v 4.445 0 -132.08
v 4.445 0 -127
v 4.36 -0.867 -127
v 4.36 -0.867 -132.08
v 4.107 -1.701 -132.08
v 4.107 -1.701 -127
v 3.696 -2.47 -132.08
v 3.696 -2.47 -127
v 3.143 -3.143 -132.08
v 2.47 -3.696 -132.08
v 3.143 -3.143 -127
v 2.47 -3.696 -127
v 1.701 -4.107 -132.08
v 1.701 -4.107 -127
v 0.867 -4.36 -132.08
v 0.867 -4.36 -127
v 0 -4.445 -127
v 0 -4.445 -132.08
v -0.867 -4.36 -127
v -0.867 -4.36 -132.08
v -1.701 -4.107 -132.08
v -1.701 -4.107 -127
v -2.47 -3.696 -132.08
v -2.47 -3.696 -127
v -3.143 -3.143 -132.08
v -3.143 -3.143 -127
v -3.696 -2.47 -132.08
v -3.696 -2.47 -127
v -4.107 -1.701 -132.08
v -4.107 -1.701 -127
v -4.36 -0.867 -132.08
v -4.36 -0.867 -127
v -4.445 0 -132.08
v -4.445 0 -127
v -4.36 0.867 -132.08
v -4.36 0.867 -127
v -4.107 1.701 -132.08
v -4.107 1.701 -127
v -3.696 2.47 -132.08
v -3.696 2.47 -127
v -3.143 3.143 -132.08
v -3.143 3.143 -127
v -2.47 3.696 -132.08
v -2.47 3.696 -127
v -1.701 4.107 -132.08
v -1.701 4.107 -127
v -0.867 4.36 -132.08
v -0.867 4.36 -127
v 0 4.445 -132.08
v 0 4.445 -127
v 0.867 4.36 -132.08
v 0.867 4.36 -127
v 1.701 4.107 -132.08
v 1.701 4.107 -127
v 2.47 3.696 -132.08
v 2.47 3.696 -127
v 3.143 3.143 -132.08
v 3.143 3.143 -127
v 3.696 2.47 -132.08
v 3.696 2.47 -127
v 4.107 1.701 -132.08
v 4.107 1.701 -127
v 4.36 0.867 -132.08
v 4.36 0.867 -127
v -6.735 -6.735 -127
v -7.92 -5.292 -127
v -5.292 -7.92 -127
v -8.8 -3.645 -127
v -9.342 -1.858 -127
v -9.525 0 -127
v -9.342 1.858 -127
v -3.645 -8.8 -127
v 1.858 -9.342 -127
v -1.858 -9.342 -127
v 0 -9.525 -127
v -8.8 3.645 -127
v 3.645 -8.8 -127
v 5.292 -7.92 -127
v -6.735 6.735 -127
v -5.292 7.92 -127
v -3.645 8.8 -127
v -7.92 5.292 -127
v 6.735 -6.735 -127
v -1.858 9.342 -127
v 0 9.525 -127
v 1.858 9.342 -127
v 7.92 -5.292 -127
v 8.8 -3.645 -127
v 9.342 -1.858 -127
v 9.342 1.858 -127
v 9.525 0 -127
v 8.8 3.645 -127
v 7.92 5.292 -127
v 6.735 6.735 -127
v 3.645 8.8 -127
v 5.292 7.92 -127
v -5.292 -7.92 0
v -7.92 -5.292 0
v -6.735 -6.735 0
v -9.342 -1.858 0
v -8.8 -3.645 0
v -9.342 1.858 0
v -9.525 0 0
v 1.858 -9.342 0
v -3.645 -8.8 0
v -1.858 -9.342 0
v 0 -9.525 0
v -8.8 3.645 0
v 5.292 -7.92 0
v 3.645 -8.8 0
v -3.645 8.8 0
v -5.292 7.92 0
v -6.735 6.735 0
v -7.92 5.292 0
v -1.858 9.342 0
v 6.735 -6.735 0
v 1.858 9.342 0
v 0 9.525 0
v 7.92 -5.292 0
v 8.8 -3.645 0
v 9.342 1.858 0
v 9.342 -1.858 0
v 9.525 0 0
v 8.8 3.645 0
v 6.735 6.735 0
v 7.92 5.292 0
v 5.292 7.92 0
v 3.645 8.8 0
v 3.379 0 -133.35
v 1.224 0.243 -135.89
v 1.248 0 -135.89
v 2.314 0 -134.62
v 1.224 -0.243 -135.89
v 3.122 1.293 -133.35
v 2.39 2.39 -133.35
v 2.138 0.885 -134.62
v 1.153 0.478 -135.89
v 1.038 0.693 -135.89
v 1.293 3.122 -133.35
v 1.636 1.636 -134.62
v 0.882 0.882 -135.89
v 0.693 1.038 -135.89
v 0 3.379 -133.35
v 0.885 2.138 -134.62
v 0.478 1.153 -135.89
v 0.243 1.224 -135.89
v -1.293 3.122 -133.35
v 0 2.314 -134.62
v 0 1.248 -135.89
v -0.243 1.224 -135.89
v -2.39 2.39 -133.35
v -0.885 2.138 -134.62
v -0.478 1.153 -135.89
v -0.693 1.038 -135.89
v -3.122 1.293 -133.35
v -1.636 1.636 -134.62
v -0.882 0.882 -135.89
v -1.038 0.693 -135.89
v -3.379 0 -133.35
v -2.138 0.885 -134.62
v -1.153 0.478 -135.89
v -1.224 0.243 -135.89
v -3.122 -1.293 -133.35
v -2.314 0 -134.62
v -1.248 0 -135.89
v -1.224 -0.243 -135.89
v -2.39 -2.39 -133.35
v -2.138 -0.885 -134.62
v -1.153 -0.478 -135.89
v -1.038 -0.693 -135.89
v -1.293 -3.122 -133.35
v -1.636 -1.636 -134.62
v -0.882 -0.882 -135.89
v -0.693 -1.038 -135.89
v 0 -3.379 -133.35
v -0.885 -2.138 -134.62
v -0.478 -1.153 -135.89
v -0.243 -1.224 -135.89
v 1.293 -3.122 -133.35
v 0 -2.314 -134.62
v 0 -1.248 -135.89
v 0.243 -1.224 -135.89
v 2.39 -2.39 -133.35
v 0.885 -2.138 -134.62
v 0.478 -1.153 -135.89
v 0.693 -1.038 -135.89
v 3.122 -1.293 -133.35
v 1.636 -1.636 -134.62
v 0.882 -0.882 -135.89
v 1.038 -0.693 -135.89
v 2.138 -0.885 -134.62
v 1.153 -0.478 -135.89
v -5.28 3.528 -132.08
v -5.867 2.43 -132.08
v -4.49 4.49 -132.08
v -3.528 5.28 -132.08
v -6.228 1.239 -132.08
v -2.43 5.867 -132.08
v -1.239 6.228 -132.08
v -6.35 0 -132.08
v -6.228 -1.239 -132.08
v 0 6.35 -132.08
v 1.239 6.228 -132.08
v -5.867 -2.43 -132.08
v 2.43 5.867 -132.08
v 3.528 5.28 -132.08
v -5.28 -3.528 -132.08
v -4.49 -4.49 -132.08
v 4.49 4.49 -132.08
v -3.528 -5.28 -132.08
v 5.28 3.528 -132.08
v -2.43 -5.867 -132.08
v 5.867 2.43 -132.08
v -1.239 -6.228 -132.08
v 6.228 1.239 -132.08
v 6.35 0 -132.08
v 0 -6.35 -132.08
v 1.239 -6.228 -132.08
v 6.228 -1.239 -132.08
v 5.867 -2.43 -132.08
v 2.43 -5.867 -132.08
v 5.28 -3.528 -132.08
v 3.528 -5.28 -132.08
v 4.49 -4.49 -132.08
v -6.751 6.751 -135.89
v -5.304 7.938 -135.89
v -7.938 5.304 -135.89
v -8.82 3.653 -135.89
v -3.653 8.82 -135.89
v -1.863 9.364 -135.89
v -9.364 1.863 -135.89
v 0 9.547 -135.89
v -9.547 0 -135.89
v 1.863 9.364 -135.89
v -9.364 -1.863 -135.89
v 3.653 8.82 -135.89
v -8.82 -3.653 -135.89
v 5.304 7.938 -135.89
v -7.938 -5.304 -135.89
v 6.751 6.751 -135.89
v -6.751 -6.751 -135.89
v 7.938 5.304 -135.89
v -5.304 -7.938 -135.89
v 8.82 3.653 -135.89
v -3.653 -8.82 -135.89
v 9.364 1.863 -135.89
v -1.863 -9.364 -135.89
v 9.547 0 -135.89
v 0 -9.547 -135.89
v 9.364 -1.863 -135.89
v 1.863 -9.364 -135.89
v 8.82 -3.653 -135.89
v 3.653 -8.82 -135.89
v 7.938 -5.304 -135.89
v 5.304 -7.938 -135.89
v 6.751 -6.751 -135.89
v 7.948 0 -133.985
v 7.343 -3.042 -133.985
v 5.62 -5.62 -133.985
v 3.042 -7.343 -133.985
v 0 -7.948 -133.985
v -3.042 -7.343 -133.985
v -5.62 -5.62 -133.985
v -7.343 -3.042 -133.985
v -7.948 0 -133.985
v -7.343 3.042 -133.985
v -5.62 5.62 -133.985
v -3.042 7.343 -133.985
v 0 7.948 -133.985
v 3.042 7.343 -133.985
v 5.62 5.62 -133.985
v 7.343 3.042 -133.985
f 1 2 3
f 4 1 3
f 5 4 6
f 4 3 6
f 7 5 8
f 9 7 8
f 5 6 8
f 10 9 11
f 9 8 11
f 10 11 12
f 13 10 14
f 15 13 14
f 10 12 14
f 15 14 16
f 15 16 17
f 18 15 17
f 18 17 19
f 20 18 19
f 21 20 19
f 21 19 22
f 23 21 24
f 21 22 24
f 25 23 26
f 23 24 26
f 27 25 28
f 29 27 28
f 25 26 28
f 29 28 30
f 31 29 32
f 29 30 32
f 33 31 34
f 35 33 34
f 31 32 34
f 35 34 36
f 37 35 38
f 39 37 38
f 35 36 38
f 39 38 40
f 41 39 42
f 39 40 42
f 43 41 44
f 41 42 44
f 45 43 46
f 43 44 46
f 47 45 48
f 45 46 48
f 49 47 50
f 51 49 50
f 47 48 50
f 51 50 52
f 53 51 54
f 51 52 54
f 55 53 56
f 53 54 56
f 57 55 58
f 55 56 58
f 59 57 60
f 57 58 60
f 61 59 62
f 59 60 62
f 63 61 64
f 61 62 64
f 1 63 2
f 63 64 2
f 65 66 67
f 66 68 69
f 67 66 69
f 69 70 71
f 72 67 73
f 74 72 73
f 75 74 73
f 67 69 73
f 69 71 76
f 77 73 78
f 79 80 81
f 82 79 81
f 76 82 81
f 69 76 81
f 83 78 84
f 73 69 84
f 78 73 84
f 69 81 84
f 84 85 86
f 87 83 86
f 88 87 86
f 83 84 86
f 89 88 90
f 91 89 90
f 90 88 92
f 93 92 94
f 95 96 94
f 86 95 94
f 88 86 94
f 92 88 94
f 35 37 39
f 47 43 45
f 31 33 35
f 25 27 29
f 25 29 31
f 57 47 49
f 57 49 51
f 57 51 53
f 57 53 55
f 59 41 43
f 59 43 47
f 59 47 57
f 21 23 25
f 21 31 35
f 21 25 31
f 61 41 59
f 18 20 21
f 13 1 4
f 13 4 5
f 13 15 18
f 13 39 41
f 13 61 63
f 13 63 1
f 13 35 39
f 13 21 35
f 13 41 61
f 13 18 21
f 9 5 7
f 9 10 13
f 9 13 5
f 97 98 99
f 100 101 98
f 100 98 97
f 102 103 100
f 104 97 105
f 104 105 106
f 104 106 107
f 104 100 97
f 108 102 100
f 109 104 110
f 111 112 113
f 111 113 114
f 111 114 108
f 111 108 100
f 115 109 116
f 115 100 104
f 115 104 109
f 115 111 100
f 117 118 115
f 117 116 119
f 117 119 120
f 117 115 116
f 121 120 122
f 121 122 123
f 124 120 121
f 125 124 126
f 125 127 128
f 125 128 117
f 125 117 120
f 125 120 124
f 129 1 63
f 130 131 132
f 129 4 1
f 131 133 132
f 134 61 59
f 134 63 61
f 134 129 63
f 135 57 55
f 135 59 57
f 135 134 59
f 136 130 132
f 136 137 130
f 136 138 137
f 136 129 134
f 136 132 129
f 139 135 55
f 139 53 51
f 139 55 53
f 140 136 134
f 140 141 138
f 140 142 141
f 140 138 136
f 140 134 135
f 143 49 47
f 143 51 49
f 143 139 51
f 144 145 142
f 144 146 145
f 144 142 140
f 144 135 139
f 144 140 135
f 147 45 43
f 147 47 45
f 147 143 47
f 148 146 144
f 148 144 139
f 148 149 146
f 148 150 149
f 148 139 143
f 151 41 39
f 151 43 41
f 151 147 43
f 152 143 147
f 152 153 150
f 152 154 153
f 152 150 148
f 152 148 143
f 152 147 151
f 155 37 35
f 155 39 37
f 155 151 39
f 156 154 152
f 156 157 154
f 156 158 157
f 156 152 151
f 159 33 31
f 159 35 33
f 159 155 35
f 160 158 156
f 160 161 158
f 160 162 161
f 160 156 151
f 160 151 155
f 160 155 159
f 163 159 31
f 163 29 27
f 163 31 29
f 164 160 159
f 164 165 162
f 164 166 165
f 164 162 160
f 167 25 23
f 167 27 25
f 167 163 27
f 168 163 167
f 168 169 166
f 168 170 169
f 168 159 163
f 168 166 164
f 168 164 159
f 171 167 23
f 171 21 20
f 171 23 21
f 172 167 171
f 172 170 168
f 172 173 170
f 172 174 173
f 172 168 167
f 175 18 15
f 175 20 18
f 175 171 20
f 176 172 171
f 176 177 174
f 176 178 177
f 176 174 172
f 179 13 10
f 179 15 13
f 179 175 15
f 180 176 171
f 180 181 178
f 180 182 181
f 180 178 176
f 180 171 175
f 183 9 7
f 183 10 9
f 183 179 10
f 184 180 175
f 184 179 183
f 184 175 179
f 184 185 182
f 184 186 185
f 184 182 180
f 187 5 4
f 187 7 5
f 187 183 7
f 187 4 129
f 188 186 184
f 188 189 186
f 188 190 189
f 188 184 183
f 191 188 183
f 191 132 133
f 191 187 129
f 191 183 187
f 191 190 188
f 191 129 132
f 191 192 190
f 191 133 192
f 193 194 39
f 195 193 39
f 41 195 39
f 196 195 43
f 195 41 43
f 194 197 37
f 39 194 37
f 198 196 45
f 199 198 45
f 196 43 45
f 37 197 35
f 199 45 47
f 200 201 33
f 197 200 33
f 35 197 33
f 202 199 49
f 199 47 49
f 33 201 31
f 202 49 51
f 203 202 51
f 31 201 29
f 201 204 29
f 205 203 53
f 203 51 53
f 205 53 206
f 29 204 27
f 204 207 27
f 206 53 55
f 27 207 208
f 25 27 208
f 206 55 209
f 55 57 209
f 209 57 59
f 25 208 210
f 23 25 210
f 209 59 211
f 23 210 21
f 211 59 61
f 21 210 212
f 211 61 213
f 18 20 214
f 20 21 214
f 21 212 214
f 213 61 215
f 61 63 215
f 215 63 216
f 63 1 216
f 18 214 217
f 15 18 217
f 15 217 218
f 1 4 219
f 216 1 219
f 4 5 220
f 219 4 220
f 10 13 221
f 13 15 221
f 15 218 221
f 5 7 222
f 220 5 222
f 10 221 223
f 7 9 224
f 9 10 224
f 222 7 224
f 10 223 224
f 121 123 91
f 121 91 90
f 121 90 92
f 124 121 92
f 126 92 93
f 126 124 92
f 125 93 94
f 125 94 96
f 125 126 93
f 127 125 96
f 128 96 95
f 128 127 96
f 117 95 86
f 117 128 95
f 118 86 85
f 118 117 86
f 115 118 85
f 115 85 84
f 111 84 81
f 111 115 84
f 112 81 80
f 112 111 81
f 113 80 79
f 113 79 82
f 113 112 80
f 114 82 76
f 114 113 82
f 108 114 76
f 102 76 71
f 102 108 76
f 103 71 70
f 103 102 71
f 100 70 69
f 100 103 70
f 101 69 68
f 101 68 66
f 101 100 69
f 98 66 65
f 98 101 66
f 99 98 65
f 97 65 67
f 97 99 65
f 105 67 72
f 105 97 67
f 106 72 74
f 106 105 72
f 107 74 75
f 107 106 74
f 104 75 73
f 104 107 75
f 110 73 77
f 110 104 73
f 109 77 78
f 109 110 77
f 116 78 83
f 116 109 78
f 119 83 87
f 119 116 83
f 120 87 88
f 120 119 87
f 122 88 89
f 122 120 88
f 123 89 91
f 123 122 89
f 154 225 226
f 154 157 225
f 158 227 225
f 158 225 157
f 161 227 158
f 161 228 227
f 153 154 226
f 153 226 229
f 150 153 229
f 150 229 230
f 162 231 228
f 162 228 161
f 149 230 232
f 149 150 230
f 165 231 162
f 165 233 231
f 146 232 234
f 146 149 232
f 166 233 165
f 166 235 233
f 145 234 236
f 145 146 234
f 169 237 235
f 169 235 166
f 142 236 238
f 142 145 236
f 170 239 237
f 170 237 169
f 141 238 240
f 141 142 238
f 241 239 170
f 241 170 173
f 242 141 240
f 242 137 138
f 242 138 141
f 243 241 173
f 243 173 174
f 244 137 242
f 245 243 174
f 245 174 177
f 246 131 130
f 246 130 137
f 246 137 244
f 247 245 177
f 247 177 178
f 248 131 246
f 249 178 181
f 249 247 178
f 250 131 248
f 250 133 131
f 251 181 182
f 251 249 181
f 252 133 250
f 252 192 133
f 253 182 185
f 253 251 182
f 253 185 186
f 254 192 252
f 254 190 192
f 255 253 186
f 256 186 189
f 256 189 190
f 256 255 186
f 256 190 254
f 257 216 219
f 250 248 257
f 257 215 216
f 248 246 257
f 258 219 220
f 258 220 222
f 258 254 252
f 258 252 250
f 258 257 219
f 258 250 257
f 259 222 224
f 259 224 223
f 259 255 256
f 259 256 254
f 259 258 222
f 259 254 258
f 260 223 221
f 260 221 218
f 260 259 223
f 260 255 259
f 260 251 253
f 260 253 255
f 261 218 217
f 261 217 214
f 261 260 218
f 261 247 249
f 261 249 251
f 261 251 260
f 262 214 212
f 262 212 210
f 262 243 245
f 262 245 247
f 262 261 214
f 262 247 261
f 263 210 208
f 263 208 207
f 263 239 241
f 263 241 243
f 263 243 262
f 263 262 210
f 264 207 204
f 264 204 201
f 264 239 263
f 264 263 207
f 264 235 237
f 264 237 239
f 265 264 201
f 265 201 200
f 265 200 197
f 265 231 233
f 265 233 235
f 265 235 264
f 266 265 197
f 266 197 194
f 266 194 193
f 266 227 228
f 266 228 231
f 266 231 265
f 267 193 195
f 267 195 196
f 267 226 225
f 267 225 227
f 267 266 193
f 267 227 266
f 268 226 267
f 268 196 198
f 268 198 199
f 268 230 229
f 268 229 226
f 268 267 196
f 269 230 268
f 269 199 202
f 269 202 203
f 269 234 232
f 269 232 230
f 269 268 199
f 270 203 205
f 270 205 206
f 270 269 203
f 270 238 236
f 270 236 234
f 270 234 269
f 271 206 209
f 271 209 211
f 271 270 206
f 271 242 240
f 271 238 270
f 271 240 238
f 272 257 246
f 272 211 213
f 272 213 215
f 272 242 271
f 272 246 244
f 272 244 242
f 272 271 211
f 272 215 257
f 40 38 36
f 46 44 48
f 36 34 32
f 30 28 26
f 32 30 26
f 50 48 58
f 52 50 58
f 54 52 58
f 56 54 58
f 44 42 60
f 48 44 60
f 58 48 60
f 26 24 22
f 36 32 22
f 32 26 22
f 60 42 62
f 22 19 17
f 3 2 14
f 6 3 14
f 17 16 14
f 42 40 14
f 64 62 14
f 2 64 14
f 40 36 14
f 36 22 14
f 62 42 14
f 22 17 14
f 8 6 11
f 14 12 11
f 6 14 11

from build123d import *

# Parameters (mm, degrees)
F0_R     = 9.525
F1_DEPTH = 127
F2_R     = 4.445
F3_DEPTH = 5.08
F4_R     = 6.35
F4_R_2   = 4.445
F5_DEPTH = 3.81
F5_TAPER = -40


with BuildPart() as f1:
    # F0 (on Top) → F1 (new body)
    with BuildSketch(Plane.XY):
        Circle(F0_R)
    extrude(amount=-F1_DEPTH)


with BuildPart() as f3:
    # F2 (on face) → F3 (new body)
    with BuildSketch(Plane(origin=(0, 0, -127), x_dir=(1, 0, 0), z_dir=(0, 0, -1))):
        Circle(F2_R)
    extrude(amount=F3_DEPTH)


with BuildPart() as f5:
    # F4 (on face) → F5 (new body)
    with BuildSketch(Plane(origin=(0, 0, -132.08), x_dir=(1, 0, 0), z_dir=(0, 0, -1))):
        Circle(F4_R)
        Circle(F4_R_2, mode=Mode.SUBTRACT)
    extrude(amount=F5_DEPTH, taper=F5_TAPER)


solid = Compound([f1.part, f3.part, f5.part])
